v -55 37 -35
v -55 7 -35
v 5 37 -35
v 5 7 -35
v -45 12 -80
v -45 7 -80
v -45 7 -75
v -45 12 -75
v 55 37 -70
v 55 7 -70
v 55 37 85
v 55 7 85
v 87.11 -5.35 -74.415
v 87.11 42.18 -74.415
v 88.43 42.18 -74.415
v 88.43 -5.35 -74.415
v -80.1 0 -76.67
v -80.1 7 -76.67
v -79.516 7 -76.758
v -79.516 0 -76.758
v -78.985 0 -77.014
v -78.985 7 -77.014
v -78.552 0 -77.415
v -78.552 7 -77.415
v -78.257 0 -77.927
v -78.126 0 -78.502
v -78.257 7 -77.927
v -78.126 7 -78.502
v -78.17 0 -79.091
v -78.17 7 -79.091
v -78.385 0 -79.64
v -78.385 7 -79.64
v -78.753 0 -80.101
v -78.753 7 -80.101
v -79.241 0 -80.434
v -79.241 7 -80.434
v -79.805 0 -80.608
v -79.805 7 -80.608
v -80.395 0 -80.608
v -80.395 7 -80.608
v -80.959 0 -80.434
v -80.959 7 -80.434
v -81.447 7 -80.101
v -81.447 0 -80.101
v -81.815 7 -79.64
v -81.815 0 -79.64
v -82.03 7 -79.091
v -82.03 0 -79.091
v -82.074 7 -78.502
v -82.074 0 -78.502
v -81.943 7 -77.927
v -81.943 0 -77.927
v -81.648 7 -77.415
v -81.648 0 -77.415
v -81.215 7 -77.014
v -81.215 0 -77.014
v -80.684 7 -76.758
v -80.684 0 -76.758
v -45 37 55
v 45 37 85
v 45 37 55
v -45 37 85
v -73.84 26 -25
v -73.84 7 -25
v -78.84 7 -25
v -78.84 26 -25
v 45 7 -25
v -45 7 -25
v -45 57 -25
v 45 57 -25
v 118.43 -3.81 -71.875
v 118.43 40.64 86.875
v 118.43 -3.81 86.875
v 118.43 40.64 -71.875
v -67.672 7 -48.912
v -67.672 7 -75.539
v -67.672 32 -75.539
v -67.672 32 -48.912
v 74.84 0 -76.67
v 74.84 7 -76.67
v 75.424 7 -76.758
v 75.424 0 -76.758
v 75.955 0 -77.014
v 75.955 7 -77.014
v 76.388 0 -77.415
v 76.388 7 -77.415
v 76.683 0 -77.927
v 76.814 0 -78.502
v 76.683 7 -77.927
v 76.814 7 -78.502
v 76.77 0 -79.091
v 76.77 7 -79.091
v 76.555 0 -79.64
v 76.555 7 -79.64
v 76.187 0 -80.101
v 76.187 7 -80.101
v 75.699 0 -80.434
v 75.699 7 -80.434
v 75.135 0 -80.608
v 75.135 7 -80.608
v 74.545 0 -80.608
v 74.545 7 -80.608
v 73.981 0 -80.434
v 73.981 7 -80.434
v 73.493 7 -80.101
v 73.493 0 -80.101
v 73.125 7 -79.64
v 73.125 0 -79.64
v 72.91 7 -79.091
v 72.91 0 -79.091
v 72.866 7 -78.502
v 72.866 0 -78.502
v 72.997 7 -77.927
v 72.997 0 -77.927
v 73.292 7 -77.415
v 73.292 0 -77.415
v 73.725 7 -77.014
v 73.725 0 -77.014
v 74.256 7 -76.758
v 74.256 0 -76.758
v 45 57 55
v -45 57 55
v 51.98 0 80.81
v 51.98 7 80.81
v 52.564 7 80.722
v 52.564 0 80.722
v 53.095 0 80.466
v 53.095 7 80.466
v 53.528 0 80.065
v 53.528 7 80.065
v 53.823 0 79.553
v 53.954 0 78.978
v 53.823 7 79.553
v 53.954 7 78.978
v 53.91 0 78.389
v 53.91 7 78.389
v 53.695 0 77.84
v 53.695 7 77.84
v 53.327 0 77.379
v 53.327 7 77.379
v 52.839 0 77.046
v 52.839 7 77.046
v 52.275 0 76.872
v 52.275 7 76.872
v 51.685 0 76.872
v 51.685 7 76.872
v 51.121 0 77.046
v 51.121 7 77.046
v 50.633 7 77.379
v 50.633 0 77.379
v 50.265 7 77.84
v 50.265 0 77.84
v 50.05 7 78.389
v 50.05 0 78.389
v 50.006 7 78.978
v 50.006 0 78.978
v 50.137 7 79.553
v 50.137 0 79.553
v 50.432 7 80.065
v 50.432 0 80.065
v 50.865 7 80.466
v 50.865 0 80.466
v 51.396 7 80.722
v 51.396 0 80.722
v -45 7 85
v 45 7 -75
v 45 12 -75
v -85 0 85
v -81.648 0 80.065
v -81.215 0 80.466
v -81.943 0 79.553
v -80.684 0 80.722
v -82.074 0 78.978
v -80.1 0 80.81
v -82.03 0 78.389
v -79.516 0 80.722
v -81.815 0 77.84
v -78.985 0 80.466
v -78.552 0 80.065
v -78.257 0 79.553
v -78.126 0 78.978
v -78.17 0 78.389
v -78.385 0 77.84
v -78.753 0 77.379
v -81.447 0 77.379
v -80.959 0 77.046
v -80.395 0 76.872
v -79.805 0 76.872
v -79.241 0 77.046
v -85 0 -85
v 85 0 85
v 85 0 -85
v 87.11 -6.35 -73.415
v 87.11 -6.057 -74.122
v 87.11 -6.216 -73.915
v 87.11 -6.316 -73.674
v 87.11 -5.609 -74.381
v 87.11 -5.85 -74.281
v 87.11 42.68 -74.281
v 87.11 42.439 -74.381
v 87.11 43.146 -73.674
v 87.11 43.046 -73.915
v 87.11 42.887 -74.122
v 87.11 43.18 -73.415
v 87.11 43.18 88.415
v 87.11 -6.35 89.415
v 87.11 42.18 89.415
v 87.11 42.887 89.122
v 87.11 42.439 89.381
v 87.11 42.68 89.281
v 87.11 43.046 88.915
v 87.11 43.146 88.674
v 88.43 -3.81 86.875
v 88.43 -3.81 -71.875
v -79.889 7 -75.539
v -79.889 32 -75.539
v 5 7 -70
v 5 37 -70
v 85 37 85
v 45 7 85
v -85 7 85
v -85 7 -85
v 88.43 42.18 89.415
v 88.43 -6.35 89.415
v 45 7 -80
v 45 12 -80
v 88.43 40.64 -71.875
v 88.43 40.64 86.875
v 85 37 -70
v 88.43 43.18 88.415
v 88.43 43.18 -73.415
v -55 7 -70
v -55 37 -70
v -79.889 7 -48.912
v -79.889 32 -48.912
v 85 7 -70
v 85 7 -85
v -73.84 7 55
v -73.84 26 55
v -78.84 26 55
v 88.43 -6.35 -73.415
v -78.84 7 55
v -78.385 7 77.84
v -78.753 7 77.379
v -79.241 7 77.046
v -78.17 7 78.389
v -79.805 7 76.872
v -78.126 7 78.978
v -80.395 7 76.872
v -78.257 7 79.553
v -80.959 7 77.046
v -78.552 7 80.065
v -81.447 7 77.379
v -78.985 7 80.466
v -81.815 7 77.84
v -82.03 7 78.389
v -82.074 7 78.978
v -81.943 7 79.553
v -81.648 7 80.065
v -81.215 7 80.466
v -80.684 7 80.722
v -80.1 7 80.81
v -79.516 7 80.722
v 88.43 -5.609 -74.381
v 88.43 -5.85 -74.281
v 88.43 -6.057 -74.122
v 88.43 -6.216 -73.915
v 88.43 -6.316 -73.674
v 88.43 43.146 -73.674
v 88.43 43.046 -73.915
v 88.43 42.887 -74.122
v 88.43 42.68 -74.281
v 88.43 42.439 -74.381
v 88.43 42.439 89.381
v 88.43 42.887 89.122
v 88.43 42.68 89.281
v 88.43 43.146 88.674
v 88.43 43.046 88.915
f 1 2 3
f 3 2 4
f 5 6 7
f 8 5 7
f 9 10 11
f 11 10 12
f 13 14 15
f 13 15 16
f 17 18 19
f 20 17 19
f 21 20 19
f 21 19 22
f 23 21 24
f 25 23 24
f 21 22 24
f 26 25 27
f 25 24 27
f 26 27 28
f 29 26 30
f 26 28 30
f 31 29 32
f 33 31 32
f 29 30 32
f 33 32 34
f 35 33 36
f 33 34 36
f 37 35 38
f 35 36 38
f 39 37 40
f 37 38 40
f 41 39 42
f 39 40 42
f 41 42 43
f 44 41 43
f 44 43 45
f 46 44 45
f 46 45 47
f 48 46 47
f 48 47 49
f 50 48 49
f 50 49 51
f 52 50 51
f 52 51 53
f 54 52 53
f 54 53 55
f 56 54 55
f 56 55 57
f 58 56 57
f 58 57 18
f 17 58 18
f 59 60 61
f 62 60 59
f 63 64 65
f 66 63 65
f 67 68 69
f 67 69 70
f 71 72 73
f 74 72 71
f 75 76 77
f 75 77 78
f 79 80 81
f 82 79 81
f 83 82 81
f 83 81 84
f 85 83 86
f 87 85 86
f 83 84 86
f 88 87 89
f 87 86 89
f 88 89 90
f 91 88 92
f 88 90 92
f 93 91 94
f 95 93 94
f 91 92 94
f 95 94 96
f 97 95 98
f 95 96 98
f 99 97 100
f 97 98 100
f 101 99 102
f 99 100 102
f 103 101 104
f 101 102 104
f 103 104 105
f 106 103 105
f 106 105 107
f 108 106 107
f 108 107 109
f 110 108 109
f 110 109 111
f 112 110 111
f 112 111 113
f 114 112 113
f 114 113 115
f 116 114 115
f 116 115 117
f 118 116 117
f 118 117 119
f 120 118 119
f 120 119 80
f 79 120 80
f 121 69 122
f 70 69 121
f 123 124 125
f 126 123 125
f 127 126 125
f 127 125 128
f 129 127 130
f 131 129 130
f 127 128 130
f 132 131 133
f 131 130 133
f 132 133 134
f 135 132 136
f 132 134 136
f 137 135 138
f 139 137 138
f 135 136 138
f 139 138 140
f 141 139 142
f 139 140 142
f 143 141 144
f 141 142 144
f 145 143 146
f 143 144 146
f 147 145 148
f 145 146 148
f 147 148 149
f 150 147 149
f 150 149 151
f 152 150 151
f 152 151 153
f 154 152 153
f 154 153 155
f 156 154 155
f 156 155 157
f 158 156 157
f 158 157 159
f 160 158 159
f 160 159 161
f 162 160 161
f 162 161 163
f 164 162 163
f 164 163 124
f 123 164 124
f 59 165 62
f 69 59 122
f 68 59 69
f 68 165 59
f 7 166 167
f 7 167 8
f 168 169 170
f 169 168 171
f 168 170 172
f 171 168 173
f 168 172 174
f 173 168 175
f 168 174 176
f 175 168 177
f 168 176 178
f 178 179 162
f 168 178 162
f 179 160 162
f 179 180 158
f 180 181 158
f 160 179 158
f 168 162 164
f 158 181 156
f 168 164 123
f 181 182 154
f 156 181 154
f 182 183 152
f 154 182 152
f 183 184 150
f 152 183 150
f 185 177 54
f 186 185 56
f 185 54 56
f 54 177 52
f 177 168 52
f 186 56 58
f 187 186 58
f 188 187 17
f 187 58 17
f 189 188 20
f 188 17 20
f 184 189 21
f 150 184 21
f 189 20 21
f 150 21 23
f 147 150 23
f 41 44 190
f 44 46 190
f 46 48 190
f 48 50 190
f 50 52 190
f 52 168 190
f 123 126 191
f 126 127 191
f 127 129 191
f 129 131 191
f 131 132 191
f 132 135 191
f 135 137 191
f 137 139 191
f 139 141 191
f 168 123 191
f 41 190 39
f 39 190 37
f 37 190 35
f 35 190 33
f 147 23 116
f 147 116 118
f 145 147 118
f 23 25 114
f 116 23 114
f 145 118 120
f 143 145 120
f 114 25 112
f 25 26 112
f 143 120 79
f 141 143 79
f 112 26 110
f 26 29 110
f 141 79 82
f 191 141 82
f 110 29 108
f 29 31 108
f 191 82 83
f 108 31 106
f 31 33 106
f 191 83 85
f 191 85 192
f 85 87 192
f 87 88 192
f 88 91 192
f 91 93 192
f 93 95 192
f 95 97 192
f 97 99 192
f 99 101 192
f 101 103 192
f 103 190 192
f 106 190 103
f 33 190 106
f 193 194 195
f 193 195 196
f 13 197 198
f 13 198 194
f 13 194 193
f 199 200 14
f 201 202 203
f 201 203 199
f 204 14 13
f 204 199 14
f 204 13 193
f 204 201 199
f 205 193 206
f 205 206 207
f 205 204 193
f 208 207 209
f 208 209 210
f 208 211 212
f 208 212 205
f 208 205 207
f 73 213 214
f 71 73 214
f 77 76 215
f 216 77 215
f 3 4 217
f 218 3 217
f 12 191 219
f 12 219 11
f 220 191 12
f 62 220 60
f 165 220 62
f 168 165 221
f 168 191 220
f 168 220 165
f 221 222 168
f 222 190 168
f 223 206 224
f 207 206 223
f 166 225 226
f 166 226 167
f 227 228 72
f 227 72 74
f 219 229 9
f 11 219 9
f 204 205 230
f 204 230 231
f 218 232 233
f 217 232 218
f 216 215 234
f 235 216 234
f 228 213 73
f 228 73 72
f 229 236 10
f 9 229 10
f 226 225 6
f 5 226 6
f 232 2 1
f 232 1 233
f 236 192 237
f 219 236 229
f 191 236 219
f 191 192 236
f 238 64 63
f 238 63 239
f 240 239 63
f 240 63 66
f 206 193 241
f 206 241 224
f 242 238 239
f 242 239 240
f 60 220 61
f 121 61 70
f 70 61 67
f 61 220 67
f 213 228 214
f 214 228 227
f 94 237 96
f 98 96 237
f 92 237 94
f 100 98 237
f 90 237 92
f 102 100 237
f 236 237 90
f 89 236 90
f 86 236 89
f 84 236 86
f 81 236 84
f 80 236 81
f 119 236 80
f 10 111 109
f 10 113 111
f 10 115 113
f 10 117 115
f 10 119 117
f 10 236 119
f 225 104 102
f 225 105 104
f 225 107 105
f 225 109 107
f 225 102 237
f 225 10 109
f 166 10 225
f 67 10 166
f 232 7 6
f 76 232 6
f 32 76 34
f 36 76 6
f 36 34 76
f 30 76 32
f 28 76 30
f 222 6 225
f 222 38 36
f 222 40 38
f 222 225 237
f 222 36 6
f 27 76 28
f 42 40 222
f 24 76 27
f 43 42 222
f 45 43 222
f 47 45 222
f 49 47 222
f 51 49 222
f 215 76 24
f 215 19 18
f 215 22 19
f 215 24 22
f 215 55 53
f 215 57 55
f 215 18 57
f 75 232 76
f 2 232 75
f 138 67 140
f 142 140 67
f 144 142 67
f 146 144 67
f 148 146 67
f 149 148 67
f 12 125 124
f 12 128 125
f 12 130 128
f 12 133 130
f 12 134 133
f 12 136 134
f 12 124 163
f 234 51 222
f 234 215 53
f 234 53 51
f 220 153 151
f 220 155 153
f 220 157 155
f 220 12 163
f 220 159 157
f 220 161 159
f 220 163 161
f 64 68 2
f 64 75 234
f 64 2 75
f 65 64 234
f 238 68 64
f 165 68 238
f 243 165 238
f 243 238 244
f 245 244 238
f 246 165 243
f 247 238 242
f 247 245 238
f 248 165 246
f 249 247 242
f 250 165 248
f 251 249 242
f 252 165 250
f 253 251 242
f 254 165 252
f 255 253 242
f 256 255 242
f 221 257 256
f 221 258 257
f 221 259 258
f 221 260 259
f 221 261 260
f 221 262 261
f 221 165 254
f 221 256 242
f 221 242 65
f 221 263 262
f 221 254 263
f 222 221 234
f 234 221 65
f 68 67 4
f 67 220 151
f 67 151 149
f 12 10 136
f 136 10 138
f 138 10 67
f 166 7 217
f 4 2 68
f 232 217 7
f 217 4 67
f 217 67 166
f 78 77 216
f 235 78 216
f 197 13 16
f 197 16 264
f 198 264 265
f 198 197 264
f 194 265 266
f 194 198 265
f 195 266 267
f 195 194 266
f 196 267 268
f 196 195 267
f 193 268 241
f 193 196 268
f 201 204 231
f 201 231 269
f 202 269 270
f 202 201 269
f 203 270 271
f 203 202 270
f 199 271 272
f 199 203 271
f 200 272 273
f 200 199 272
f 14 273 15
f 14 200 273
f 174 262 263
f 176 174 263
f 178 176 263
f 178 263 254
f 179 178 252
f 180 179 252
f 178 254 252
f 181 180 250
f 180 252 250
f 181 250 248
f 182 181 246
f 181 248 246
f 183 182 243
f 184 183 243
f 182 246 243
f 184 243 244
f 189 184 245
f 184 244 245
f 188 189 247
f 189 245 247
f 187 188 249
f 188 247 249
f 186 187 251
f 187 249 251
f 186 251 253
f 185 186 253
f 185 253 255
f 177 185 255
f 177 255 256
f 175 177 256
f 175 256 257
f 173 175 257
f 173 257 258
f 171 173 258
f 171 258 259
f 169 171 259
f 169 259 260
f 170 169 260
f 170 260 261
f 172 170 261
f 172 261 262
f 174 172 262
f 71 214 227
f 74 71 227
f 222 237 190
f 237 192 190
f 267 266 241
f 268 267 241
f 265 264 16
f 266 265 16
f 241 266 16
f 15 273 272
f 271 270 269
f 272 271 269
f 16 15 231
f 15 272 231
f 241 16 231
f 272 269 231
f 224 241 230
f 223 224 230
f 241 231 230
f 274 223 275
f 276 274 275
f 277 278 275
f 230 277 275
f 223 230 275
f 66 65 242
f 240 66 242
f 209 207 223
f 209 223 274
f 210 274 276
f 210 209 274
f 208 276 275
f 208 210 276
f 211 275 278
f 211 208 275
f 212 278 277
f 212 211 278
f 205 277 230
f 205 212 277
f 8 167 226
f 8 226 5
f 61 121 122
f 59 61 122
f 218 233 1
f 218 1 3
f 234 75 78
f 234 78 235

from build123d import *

# Parameters (mm, degrees)
SKETCH1_W                          = 170
SKETCH1_H                          = 170
ALUSPLAAT_DEPTH                    = 2
SKETCH2_W                          = 30
SKETCH2_H                          = 155
PISTIKUD_DEPTH                     = 35
SKETCH3_W                          = 90
SKETCH3_H                          = 110
CPU_M_LUD_DEPTH                    = 55
SKETCH4_W                          = 60
SKETCH4_H                          = 35
SININE_RADIKAS_DEPTH               = 35
SKETCH5_W                          = 90
SKETCH5_H                          = 5
PCIE_PESA_DEPTH                    = 10
SKETCH6_W                          = 12.216790721
SKETCH6_H                          = 26.62710746
RAID_PESAD_DEPTH                   = 30
SKETCH7_W                          = 170
SKETCH7_H                          = 170
LE_LDINE_M_RA_DEPTH                = 5
SKETCH8_W                          = 5
SKETCH8_H                          = 80
PATREI_JA_IGASUGUSED_L_LITID_DEPTH = 19
SKETCH9_OUTSIDE_W                  = 221.416
SKETCH9_OUTSIDE_H                  = 221.416
SKETCH9_OUTSIDE_W_2                = 90
SKETCH9_OUTSIDE_H_2                = 80
M_LUD_DEPTH                        = 20
CUT_EXTRUDE2_REACH                 = 132.192
SKETCH10_R                         = 1.98
BOSS_EXTRUDE1_DEPTH                = 1.32
SKETCH12_W                         = 158.75
SKETCH12_H                         = 44.45
BOSS_EXTRUDE2_DEPTH                = 30


with BuildPart() as part:
    # Sketch1 → alusplaat (new body)
    with BuildSketch(Plane(origin=(0, 0, 0), x_dir=(1, 0, 0), z_dir=(0, 1, 0))):
        Rectangle(SKETCH1_W, SKETCH1_H)
    extrude(amount=ALUSPLAAT_DEPTH)

    # Sketch2 → pistikud (add)
    with BuildSketch(Plane(origin=(0, 2, 0), x_dir=(-1, 0, 0), z_dir=(0, 1, 0))):
        with Locations((-70, 7.5)):
            Rectangle(SKETCH2_W, SKETCH2_H)
    extrude(amount=PISTIKUD_DEPTH)

    # Sketch3 → cpu+mälud (add)
    with BuildSketch(Plane(origin=(0, 2, 0), x_dir=(1, 0, 0), z_dir=(0, 1, 0))):
        with Locations((0, -30)):
            Rectangle(SKETCH3_W, SKETCH3_H)
    extrude(amount=CPU_M_LUD_DEPTH)

    # Sketch4 → sinine radikas (add)
    with BuildSketch(Plane(origin=(0, 2, 0), x_dir=(1, 0, 0), z_dir=(0, 1, 0))):
        with Locations((-25, 52.5)):
            Rectangle(SKETCH4_W, SKETCH4_H)
    extrude(amount=SININE_RADIKAS_DEPTH)

    # Sketch5 → pcie pesa (add)
    with BuildSketch(Plane(origin=(0, 2, 0), x_dir=(-1, 0, 0), z_dir=(0, 1, 0))):
        with Locations((0, -77.5)):
            Rectangle(SKETCH5_W, SKETCH5_H)
    extrude(amount=PCIE_PESA_DEPTH)

    # Sketch6 → raid pesad (add)
    with BuildSketch(Plane(origin=(0, 2, 0), x_dir=(-1, 0, 0), z_dir=(0, 1, 0))):
        with Locations((73.780405742, -62.225935716)):
            Rectangle(SKETCH6_W, SKETCH6_H)
    extrude(amount=RAID_PESAD_DEPTH)

    # Sketch7 → üleüldine müra (add)
    with BuildSketch(Plane(origin=(0, 2, 0), x_dir=(-1, 0, 0), z_dir=(0, 1, 0))):
        Rectangle(SKETCH7_W, SKETCH7_H)
    extrude(amount=LE_LDINE_M_RA_DEPTH)

    # Sketch8 → patrei ja igasugused lülitid (add)
    with BuildSketch(Plane(origin=(0, 7, 0), x_dir=(-1, 0, 0), z_dir=(0, 1, 0))):
        with Locations((76.340130234, 15)):
            Rectangle(SKETCH8_W, SKETCH8_H)
    extrude(amount=PATREI_JA_IGASUGUSED_L_LITID_DEPTH)

    # Sketch9 outside → mälud (cut)
    with BuildSketch(Plane(origin=(0, 57, 0), x_dir=(-1, 0, 0), z_dir=(0, 1, 0))):
        Rectangle(SKETCH9_OUTSIDE_W, SKETCH9_OUTSIDE_H)
        with Locations((0, 15)):
            Rectangle(SKETCH9_OUTSIDE_W_2, SKETCH9_OUTSIDE_H_2, mode=Mode.SUBTRACT)
    extrude(amount=-M_LUD_DEPTH, mode=Mode.SUBTRACT)

    # Sketch10 → Cut-Extrude2 (cut, up to next)
    with BuildSketch(Plane(origin=(0, 7, 0), x_dir=(1, 0, 0), z_dir=(0, 1, 0)), mode=Mode.PRIVATE) as cut_extrude2_sk1:
        with Locations(Location((74.84, 78.65, 0), (0, 0, 270))):
            Circle(SKETCH10_R)
    cut_extrude2_tool1 = extrude(cut_extrude2_sk1.sketch, amount=-CUT_EXTRUDE2_REACH, mode=Mode.PRIVATE) & part.part
    # Sketch10 → Cut-Extrude2 (cut, up to next)
    with BuildSketch(Plane(origin=(0, 7, 0), x_dir=(1, 0, 0), z_dir=(0, 1, 0)), mode=Mode.PRIVATE) as cut_extrude2_sk2:
        with Locations(Location((-80.1, 78.65, 0), (0, 0, 270))):
            Circle(SKETCH10_R)
    cut_extrude2_tool2 = extrude(cut_extrude2_sk2.sketch, amount=-CUT_EXTRUDE2_REACH, mode=Mode.PRIVATE) & part.part
    # Sketch10 → Cut-Extrude2 (cut, up to next)
    with BuildSketch(Plane(origin=(0, 7, 0), x_dir=(1, 0, 0), z_dir=(0, 1, 0)), mode=Mode.PRIVATE) as cut_extrude2_sk3:
        with Locations(Location((-80.1, -78.83, 0), (0, 0, 270))):
            Circle(SKETCH10_R)
    cut_extrude2_tool3 = extrude(cut_extrude2_sk3.sketch, amount=-CUT_EXTRUDE2_REACH, mode=Mode.PRIVATE) & part.part
    # Sketch10 → Cut-Extrude2 (cut, up to next)
    with BuildSketch(Plane(origin=(0, 7, 0), x_dir=(1, 0, 0), z_dir=(0, 1, 0)), mode=Mode.PRIVATE) as cut_extrude2_sk4:
        with Locations(Location((51.98, -78.83, 0), (0, 0, 270))):
            Circle(SKETCH10_R)
    cut_extrude2_tool4 = extrude(cut_extrude2_sk4.sketch, amount=-CUT_EXTRUDE2_REACH, mode=Mode.PRIVATE) & part.part
    add(cut_extrude2_tool1.solids().sort_by_distance((74.84, 7, -78.65))[0], mode=Mode.SUBTRACT)
    add(cut_extrude2_tool2.solids().sort_by_distance((-80.1, 7, -78.65))[0], mode=Mode.SUBTRACT)
    add(cut_extrude2_tool3.solids().sort_by_distance((-80.1, 7, 78.83))[0], mode=Mode.SUBTRACT)
    add(cut_extrude2_tool4.solids().sort_by_distance((51.98, 7, 78.83))[0], mode=Mode.SUBTRACT)


with BuildPart() as body_2:
    # Sketch11 → Boss-Extrude1 (new body)
    with BuildSketch(Plane(origin=(87.11, 0, 0), x_dir=(0, 0, -1), z_dir=(1, 0, 0))):
        with BuildLine():
            Line((-88.415, 43.18), (73.415, 43.18))
            ThreePointArc((73.415, 43.18), (74.122106781, 42.887106781), (74.415, 42.18))
            Line((74.415, 42.18), (74.415, -5.35))
            ThreePointArc((74.415, -5.35), (74.122106781, -6.057106781), (73.415, -6.35))
            Line((73.415, -6.35), (-89.415, -6.35))
            Line((-89.415, -6.35), (-89.415, 42.18))
            ThreePointArc((-89.415, 42.18), (-89.122106781, 42.887106781), (-88.415, 43.18))
        make_face()
    extrude(amount=BOSS_EXTRUDE1_DEPTH)


with BuildPart() as body_3:
    # Sketch12 → Boss-Extrude2 (new body)
    with BuildSketch(Plane(origin=(88.43, 0, 0), x_dir=(0, 0, -1), z_dir=(1, 0, 0))):
        with Locations((-7.5, 18.415)):
            Rectangle(SKETCH12_W, SKETCH12_H)
    extrude(amount=BOSS_EXTRUDE2_DEPTH)


solid = Compound([part.part, body_2.part, body_3.part])
